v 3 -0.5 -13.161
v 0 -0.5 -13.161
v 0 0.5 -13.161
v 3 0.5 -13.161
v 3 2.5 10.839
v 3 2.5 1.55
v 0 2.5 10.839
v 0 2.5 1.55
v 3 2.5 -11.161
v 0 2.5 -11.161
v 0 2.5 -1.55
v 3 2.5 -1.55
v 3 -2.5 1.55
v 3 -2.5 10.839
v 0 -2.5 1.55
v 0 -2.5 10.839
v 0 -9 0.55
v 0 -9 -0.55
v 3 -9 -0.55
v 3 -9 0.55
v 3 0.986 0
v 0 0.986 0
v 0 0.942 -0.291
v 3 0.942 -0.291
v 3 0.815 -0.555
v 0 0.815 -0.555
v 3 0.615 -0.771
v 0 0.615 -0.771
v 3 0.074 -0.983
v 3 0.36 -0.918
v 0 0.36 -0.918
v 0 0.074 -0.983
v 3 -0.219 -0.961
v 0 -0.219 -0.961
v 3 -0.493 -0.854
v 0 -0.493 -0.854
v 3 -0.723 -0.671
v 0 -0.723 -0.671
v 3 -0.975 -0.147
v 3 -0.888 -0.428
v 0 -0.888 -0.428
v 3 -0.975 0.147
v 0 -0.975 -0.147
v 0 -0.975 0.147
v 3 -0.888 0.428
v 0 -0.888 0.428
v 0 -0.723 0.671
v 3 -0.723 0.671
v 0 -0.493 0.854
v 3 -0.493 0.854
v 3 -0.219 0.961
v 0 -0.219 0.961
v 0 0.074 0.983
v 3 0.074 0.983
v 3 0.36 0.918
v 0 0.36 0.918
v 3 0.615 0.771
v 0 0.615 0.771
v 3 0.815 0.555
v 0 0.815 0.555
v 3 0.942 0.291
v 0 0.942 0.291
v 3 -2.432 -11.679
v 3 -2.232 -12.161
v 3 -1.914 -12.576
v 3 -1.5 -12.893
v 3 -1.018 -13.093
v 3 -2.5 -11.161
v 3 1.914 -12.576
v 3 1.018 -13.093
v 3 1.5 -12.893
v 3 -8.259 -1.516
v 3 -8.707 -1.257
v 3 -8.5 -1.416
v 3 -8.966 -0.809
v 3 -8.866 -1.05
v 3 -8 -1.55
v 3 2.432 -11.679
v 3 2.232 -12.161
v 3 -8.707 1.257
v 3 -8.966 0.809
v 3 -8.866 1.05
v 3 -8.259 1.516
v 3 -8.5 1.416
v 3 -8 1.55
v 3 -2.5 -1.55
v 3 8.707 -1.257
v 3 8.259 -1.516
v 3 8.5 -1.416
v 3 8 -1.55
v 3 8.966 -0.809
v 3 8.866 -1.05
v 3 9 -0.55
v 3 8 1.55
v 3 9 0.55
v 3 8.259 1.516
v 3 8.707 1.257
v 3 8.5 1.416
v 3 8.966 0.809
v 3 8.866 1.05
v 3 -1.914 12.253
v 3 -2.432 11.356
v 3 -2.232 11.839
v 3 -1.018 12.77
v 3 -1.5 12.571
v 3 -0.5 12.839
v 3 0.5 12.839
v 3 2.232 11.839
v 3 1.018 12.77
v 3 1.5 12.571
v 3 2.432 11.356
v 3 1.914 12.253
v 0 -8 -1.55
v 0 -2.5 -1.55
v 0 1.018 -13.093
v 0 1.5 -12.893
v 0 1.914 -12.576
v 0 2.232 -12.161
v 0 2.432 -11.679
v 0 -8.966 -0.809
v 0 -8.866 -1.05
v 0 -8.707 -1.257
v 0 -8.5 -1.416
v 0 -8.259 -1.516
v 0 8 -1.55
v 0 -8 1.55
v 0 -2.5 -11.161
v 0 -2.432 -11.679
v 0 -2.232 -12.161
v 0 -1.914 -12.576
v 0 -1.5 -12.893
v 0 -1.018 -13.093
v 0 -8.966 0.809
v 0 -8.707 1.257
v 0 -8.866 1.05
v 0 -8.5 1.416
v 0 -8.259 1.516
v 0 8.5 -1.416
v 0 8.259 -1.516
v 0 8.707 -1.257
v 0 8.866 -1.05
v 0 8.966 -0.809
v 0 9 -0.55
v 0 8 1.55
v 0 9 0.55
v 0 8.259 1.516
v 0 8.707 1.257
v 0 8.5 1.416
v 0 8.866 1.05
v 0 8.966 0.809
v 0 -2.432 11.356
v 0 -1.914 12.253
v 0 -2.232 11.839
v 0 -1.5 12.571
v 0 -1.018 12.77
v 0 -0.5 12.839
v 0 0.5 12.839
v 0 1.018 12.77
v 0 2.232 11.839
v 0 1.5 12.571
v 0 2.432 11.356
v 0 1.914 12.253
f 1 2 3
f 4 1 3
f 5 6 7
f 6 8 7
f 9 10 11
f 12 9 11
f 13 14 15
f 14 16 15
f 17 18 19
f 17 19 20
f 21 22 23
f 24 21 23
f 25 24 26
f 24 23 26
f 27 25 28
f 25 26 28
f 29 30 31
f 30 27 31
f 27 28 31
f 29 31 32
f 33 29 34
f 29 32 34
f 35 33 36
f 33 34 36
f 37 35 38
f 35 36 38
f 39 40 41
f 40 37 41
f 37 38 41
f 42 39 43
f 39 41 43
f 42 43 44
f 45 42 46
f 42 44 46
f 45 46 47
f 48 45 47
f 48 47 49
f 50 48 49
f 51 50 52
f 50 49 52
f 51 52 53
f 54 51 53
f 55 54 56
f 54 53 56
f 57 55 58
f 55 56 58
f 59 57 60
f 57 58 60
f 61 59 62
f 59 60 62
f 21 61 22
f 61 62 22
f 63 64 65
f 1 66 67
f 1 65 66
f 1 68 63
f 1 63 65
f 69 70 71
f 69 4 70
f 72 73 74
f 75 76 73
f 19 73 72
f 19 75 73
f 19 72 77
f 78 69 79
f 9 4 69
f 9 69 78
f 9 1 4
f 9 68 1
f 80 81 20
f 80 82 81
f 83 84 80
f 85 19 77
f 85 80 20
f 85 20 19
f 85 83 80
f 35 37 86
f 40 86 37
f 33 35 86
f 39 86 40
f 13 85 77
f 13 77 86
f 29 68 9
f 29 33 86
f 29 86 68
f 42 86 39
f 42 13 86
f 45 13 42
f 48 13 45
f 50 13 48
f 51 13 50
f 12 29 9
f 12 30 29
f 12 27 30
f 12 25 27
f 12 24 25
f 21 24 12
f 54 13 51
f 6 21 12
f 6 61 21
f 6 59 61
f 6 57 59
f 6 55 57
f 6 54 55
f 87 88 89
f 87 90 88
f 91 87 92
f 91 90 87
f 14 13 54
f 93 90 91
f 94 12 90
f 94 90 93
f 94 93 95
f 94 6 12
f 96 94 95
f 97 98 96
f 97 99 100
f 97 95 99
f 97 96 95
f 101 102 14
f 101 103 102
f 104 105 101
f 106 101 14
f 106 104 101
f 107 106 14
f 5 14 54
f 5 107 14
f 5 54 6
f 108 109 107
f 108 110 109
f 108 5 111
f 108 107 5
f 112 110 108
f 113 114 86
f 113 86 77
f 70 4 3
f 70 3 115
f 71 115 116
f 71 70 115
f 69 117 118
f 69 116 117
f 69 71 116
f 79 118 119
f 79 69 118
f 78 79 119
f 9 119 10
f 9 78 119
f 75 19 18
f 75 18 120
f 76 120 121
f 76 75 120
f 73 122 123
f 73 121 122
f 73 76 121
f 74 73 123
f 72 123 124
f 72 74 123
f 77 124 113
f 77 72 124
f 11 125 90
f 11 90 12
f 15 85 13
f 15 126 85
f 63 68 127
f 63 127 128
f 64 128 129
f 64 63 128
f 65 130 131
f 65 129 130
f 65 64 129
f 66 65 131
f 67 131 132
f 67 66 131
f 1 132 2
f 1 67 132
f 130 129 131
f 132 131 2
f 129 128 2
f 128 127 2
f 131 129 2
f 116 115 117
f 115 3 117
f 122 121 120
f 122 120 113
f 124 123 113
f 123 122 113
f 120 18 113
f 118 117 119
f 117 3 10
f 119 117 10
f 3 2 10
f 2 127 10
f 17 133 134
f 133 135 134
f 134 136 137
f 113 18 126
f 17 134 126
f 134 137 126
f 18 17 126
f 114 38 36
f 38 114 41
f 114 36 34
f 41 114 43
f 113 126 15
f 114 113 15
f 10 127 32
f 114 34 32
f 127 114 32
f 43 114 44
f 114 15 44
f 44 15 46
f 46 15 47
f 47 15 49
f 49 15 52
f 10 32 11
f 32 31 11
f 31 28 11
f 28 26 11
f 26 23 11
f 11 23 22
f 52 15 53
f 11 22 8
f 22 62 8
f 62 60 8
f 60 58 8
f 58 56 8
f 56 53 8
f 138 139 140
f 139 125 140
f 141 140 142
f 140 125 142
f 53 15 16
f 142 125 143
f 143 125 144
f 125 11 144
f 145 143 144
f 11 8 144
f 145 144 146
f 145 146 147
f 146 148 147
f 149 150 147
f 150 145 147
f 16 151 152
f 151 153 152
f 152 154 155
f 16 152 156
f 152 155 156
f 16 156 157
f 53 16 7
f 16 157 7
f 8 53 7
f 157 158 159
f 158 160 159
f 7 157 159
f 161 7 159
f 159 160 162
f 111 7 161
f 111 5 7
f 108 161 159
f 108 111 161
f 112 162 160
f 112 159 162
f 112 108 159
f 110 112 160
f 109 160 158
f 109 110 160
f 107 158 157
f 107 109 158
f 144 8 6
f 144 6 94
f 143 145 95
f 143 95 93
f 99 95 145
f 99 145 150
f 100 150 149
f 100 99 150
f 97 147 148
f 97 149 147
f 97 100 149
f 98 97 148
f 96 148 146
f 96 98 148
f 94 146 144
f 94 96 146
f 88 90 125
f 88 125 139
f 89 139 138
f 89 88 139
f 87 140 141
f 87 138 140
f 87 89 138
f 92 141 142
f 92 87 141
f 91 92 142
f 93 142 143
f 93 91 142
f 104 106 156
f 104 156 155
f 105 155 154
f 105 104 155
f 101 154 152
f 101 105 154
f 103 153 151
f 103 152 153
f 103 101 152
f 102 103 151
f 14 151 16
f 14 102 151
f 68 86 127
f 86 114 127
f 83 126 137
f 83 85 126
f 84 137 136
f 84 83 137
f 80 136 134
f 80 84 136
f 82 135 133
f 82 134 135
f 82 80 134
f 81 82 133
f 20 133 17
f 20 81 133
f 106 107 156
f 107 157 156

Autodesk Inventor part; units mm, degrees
ref_plane "YZ Plane" through (0, 0, 0) normal (1, 0, 0) x (0, 1, 0)
ref_plane "XZ Plane" through (0, 0, 0) normal (0, 1, 0) x (-1, 0, 0)
ref_plane "XY Plane" through (0, 0, 0) normal (0, 0, 1) x (1, 0, 0)
sketch "Sketch6" plane through (0, 0, 0) normal (1, 0, 0) x (0, 1, 0)
  point P0 (0, 0)
sketch "Sketch7" plane through (0, 0, 0) normal (1, 0, 0) x (0, 1, 0)
  line L0 (-2.5, -13.1614) -> (2.5, -13.1614)
  line L1 (2.5, 12.8386) -> (-2.5, 12.8386)
  circle A0 centre (0, 0) radius 0.9858
  line L2 (9, 1.55) -> (9, -1.55)
  line L3 (-9, -1.55) -> (-9, 1.55)
  line L4 (2.5, 1.55) -> (9, 1.55)
  line L5 (-9, 1.55) -> (-2.5, 1.55)
  line L6 (-2.5, -1.55) -> (-9, -1.55)
  line L7 (9, -1.55) -> (2.5, -1.55)
  line L8 (2.5, 1.55) -> (2.5, 12.8386)
  line L9 (2.5, -13.1614) -> (2.5, -1.55)
  line L10 (-2.5, -1.55) -> (-2.5, -13.1614)
  line L11 (-2.5, 12.8386) -> (-2.5, 1.55)
  point P0 (-9, 0)
  point P1 (0, 12.8386)
  point P2 (9, 0)
  point P3 (0, -13.1614)
  dimension "d85" = 5
  dimension "d86" = 3.1
  dimension "d90" = 26
  dimension "d91" = 3.1
  dimension "d92" = 5
  dimension "d93" = 18
extrude "Extrusion3" add sketch "Sketch7" along normal blind 3
fillet "Fillet1" radius 1 1 edges at (1.5, 9, 1.55)
fillet "Fillet2" radius 1 1 edges at (1.5, 9, -1.55)
fillet "Fillet3" radius 1 1 edges at (1.5, -9, -1.55)
fillet "Fillet4" radius 1 1 edges at (1.5, -9, 1.55)
fillet "Fillet5" radius 2 1 edges at (1.5, -2.5, 12.8386)
fillet "Fillet6" radius 2 1 edges at (1.5, 2.5, 12.8386)
fillet "Fillet7" radius 2 1 edges at (1.5, 2.5, -13.1614)
fillet "Fillet8" radius 2 1 edges at (1.5, -2.5, -13.1614)
properties part number "6P-016 cutout"
